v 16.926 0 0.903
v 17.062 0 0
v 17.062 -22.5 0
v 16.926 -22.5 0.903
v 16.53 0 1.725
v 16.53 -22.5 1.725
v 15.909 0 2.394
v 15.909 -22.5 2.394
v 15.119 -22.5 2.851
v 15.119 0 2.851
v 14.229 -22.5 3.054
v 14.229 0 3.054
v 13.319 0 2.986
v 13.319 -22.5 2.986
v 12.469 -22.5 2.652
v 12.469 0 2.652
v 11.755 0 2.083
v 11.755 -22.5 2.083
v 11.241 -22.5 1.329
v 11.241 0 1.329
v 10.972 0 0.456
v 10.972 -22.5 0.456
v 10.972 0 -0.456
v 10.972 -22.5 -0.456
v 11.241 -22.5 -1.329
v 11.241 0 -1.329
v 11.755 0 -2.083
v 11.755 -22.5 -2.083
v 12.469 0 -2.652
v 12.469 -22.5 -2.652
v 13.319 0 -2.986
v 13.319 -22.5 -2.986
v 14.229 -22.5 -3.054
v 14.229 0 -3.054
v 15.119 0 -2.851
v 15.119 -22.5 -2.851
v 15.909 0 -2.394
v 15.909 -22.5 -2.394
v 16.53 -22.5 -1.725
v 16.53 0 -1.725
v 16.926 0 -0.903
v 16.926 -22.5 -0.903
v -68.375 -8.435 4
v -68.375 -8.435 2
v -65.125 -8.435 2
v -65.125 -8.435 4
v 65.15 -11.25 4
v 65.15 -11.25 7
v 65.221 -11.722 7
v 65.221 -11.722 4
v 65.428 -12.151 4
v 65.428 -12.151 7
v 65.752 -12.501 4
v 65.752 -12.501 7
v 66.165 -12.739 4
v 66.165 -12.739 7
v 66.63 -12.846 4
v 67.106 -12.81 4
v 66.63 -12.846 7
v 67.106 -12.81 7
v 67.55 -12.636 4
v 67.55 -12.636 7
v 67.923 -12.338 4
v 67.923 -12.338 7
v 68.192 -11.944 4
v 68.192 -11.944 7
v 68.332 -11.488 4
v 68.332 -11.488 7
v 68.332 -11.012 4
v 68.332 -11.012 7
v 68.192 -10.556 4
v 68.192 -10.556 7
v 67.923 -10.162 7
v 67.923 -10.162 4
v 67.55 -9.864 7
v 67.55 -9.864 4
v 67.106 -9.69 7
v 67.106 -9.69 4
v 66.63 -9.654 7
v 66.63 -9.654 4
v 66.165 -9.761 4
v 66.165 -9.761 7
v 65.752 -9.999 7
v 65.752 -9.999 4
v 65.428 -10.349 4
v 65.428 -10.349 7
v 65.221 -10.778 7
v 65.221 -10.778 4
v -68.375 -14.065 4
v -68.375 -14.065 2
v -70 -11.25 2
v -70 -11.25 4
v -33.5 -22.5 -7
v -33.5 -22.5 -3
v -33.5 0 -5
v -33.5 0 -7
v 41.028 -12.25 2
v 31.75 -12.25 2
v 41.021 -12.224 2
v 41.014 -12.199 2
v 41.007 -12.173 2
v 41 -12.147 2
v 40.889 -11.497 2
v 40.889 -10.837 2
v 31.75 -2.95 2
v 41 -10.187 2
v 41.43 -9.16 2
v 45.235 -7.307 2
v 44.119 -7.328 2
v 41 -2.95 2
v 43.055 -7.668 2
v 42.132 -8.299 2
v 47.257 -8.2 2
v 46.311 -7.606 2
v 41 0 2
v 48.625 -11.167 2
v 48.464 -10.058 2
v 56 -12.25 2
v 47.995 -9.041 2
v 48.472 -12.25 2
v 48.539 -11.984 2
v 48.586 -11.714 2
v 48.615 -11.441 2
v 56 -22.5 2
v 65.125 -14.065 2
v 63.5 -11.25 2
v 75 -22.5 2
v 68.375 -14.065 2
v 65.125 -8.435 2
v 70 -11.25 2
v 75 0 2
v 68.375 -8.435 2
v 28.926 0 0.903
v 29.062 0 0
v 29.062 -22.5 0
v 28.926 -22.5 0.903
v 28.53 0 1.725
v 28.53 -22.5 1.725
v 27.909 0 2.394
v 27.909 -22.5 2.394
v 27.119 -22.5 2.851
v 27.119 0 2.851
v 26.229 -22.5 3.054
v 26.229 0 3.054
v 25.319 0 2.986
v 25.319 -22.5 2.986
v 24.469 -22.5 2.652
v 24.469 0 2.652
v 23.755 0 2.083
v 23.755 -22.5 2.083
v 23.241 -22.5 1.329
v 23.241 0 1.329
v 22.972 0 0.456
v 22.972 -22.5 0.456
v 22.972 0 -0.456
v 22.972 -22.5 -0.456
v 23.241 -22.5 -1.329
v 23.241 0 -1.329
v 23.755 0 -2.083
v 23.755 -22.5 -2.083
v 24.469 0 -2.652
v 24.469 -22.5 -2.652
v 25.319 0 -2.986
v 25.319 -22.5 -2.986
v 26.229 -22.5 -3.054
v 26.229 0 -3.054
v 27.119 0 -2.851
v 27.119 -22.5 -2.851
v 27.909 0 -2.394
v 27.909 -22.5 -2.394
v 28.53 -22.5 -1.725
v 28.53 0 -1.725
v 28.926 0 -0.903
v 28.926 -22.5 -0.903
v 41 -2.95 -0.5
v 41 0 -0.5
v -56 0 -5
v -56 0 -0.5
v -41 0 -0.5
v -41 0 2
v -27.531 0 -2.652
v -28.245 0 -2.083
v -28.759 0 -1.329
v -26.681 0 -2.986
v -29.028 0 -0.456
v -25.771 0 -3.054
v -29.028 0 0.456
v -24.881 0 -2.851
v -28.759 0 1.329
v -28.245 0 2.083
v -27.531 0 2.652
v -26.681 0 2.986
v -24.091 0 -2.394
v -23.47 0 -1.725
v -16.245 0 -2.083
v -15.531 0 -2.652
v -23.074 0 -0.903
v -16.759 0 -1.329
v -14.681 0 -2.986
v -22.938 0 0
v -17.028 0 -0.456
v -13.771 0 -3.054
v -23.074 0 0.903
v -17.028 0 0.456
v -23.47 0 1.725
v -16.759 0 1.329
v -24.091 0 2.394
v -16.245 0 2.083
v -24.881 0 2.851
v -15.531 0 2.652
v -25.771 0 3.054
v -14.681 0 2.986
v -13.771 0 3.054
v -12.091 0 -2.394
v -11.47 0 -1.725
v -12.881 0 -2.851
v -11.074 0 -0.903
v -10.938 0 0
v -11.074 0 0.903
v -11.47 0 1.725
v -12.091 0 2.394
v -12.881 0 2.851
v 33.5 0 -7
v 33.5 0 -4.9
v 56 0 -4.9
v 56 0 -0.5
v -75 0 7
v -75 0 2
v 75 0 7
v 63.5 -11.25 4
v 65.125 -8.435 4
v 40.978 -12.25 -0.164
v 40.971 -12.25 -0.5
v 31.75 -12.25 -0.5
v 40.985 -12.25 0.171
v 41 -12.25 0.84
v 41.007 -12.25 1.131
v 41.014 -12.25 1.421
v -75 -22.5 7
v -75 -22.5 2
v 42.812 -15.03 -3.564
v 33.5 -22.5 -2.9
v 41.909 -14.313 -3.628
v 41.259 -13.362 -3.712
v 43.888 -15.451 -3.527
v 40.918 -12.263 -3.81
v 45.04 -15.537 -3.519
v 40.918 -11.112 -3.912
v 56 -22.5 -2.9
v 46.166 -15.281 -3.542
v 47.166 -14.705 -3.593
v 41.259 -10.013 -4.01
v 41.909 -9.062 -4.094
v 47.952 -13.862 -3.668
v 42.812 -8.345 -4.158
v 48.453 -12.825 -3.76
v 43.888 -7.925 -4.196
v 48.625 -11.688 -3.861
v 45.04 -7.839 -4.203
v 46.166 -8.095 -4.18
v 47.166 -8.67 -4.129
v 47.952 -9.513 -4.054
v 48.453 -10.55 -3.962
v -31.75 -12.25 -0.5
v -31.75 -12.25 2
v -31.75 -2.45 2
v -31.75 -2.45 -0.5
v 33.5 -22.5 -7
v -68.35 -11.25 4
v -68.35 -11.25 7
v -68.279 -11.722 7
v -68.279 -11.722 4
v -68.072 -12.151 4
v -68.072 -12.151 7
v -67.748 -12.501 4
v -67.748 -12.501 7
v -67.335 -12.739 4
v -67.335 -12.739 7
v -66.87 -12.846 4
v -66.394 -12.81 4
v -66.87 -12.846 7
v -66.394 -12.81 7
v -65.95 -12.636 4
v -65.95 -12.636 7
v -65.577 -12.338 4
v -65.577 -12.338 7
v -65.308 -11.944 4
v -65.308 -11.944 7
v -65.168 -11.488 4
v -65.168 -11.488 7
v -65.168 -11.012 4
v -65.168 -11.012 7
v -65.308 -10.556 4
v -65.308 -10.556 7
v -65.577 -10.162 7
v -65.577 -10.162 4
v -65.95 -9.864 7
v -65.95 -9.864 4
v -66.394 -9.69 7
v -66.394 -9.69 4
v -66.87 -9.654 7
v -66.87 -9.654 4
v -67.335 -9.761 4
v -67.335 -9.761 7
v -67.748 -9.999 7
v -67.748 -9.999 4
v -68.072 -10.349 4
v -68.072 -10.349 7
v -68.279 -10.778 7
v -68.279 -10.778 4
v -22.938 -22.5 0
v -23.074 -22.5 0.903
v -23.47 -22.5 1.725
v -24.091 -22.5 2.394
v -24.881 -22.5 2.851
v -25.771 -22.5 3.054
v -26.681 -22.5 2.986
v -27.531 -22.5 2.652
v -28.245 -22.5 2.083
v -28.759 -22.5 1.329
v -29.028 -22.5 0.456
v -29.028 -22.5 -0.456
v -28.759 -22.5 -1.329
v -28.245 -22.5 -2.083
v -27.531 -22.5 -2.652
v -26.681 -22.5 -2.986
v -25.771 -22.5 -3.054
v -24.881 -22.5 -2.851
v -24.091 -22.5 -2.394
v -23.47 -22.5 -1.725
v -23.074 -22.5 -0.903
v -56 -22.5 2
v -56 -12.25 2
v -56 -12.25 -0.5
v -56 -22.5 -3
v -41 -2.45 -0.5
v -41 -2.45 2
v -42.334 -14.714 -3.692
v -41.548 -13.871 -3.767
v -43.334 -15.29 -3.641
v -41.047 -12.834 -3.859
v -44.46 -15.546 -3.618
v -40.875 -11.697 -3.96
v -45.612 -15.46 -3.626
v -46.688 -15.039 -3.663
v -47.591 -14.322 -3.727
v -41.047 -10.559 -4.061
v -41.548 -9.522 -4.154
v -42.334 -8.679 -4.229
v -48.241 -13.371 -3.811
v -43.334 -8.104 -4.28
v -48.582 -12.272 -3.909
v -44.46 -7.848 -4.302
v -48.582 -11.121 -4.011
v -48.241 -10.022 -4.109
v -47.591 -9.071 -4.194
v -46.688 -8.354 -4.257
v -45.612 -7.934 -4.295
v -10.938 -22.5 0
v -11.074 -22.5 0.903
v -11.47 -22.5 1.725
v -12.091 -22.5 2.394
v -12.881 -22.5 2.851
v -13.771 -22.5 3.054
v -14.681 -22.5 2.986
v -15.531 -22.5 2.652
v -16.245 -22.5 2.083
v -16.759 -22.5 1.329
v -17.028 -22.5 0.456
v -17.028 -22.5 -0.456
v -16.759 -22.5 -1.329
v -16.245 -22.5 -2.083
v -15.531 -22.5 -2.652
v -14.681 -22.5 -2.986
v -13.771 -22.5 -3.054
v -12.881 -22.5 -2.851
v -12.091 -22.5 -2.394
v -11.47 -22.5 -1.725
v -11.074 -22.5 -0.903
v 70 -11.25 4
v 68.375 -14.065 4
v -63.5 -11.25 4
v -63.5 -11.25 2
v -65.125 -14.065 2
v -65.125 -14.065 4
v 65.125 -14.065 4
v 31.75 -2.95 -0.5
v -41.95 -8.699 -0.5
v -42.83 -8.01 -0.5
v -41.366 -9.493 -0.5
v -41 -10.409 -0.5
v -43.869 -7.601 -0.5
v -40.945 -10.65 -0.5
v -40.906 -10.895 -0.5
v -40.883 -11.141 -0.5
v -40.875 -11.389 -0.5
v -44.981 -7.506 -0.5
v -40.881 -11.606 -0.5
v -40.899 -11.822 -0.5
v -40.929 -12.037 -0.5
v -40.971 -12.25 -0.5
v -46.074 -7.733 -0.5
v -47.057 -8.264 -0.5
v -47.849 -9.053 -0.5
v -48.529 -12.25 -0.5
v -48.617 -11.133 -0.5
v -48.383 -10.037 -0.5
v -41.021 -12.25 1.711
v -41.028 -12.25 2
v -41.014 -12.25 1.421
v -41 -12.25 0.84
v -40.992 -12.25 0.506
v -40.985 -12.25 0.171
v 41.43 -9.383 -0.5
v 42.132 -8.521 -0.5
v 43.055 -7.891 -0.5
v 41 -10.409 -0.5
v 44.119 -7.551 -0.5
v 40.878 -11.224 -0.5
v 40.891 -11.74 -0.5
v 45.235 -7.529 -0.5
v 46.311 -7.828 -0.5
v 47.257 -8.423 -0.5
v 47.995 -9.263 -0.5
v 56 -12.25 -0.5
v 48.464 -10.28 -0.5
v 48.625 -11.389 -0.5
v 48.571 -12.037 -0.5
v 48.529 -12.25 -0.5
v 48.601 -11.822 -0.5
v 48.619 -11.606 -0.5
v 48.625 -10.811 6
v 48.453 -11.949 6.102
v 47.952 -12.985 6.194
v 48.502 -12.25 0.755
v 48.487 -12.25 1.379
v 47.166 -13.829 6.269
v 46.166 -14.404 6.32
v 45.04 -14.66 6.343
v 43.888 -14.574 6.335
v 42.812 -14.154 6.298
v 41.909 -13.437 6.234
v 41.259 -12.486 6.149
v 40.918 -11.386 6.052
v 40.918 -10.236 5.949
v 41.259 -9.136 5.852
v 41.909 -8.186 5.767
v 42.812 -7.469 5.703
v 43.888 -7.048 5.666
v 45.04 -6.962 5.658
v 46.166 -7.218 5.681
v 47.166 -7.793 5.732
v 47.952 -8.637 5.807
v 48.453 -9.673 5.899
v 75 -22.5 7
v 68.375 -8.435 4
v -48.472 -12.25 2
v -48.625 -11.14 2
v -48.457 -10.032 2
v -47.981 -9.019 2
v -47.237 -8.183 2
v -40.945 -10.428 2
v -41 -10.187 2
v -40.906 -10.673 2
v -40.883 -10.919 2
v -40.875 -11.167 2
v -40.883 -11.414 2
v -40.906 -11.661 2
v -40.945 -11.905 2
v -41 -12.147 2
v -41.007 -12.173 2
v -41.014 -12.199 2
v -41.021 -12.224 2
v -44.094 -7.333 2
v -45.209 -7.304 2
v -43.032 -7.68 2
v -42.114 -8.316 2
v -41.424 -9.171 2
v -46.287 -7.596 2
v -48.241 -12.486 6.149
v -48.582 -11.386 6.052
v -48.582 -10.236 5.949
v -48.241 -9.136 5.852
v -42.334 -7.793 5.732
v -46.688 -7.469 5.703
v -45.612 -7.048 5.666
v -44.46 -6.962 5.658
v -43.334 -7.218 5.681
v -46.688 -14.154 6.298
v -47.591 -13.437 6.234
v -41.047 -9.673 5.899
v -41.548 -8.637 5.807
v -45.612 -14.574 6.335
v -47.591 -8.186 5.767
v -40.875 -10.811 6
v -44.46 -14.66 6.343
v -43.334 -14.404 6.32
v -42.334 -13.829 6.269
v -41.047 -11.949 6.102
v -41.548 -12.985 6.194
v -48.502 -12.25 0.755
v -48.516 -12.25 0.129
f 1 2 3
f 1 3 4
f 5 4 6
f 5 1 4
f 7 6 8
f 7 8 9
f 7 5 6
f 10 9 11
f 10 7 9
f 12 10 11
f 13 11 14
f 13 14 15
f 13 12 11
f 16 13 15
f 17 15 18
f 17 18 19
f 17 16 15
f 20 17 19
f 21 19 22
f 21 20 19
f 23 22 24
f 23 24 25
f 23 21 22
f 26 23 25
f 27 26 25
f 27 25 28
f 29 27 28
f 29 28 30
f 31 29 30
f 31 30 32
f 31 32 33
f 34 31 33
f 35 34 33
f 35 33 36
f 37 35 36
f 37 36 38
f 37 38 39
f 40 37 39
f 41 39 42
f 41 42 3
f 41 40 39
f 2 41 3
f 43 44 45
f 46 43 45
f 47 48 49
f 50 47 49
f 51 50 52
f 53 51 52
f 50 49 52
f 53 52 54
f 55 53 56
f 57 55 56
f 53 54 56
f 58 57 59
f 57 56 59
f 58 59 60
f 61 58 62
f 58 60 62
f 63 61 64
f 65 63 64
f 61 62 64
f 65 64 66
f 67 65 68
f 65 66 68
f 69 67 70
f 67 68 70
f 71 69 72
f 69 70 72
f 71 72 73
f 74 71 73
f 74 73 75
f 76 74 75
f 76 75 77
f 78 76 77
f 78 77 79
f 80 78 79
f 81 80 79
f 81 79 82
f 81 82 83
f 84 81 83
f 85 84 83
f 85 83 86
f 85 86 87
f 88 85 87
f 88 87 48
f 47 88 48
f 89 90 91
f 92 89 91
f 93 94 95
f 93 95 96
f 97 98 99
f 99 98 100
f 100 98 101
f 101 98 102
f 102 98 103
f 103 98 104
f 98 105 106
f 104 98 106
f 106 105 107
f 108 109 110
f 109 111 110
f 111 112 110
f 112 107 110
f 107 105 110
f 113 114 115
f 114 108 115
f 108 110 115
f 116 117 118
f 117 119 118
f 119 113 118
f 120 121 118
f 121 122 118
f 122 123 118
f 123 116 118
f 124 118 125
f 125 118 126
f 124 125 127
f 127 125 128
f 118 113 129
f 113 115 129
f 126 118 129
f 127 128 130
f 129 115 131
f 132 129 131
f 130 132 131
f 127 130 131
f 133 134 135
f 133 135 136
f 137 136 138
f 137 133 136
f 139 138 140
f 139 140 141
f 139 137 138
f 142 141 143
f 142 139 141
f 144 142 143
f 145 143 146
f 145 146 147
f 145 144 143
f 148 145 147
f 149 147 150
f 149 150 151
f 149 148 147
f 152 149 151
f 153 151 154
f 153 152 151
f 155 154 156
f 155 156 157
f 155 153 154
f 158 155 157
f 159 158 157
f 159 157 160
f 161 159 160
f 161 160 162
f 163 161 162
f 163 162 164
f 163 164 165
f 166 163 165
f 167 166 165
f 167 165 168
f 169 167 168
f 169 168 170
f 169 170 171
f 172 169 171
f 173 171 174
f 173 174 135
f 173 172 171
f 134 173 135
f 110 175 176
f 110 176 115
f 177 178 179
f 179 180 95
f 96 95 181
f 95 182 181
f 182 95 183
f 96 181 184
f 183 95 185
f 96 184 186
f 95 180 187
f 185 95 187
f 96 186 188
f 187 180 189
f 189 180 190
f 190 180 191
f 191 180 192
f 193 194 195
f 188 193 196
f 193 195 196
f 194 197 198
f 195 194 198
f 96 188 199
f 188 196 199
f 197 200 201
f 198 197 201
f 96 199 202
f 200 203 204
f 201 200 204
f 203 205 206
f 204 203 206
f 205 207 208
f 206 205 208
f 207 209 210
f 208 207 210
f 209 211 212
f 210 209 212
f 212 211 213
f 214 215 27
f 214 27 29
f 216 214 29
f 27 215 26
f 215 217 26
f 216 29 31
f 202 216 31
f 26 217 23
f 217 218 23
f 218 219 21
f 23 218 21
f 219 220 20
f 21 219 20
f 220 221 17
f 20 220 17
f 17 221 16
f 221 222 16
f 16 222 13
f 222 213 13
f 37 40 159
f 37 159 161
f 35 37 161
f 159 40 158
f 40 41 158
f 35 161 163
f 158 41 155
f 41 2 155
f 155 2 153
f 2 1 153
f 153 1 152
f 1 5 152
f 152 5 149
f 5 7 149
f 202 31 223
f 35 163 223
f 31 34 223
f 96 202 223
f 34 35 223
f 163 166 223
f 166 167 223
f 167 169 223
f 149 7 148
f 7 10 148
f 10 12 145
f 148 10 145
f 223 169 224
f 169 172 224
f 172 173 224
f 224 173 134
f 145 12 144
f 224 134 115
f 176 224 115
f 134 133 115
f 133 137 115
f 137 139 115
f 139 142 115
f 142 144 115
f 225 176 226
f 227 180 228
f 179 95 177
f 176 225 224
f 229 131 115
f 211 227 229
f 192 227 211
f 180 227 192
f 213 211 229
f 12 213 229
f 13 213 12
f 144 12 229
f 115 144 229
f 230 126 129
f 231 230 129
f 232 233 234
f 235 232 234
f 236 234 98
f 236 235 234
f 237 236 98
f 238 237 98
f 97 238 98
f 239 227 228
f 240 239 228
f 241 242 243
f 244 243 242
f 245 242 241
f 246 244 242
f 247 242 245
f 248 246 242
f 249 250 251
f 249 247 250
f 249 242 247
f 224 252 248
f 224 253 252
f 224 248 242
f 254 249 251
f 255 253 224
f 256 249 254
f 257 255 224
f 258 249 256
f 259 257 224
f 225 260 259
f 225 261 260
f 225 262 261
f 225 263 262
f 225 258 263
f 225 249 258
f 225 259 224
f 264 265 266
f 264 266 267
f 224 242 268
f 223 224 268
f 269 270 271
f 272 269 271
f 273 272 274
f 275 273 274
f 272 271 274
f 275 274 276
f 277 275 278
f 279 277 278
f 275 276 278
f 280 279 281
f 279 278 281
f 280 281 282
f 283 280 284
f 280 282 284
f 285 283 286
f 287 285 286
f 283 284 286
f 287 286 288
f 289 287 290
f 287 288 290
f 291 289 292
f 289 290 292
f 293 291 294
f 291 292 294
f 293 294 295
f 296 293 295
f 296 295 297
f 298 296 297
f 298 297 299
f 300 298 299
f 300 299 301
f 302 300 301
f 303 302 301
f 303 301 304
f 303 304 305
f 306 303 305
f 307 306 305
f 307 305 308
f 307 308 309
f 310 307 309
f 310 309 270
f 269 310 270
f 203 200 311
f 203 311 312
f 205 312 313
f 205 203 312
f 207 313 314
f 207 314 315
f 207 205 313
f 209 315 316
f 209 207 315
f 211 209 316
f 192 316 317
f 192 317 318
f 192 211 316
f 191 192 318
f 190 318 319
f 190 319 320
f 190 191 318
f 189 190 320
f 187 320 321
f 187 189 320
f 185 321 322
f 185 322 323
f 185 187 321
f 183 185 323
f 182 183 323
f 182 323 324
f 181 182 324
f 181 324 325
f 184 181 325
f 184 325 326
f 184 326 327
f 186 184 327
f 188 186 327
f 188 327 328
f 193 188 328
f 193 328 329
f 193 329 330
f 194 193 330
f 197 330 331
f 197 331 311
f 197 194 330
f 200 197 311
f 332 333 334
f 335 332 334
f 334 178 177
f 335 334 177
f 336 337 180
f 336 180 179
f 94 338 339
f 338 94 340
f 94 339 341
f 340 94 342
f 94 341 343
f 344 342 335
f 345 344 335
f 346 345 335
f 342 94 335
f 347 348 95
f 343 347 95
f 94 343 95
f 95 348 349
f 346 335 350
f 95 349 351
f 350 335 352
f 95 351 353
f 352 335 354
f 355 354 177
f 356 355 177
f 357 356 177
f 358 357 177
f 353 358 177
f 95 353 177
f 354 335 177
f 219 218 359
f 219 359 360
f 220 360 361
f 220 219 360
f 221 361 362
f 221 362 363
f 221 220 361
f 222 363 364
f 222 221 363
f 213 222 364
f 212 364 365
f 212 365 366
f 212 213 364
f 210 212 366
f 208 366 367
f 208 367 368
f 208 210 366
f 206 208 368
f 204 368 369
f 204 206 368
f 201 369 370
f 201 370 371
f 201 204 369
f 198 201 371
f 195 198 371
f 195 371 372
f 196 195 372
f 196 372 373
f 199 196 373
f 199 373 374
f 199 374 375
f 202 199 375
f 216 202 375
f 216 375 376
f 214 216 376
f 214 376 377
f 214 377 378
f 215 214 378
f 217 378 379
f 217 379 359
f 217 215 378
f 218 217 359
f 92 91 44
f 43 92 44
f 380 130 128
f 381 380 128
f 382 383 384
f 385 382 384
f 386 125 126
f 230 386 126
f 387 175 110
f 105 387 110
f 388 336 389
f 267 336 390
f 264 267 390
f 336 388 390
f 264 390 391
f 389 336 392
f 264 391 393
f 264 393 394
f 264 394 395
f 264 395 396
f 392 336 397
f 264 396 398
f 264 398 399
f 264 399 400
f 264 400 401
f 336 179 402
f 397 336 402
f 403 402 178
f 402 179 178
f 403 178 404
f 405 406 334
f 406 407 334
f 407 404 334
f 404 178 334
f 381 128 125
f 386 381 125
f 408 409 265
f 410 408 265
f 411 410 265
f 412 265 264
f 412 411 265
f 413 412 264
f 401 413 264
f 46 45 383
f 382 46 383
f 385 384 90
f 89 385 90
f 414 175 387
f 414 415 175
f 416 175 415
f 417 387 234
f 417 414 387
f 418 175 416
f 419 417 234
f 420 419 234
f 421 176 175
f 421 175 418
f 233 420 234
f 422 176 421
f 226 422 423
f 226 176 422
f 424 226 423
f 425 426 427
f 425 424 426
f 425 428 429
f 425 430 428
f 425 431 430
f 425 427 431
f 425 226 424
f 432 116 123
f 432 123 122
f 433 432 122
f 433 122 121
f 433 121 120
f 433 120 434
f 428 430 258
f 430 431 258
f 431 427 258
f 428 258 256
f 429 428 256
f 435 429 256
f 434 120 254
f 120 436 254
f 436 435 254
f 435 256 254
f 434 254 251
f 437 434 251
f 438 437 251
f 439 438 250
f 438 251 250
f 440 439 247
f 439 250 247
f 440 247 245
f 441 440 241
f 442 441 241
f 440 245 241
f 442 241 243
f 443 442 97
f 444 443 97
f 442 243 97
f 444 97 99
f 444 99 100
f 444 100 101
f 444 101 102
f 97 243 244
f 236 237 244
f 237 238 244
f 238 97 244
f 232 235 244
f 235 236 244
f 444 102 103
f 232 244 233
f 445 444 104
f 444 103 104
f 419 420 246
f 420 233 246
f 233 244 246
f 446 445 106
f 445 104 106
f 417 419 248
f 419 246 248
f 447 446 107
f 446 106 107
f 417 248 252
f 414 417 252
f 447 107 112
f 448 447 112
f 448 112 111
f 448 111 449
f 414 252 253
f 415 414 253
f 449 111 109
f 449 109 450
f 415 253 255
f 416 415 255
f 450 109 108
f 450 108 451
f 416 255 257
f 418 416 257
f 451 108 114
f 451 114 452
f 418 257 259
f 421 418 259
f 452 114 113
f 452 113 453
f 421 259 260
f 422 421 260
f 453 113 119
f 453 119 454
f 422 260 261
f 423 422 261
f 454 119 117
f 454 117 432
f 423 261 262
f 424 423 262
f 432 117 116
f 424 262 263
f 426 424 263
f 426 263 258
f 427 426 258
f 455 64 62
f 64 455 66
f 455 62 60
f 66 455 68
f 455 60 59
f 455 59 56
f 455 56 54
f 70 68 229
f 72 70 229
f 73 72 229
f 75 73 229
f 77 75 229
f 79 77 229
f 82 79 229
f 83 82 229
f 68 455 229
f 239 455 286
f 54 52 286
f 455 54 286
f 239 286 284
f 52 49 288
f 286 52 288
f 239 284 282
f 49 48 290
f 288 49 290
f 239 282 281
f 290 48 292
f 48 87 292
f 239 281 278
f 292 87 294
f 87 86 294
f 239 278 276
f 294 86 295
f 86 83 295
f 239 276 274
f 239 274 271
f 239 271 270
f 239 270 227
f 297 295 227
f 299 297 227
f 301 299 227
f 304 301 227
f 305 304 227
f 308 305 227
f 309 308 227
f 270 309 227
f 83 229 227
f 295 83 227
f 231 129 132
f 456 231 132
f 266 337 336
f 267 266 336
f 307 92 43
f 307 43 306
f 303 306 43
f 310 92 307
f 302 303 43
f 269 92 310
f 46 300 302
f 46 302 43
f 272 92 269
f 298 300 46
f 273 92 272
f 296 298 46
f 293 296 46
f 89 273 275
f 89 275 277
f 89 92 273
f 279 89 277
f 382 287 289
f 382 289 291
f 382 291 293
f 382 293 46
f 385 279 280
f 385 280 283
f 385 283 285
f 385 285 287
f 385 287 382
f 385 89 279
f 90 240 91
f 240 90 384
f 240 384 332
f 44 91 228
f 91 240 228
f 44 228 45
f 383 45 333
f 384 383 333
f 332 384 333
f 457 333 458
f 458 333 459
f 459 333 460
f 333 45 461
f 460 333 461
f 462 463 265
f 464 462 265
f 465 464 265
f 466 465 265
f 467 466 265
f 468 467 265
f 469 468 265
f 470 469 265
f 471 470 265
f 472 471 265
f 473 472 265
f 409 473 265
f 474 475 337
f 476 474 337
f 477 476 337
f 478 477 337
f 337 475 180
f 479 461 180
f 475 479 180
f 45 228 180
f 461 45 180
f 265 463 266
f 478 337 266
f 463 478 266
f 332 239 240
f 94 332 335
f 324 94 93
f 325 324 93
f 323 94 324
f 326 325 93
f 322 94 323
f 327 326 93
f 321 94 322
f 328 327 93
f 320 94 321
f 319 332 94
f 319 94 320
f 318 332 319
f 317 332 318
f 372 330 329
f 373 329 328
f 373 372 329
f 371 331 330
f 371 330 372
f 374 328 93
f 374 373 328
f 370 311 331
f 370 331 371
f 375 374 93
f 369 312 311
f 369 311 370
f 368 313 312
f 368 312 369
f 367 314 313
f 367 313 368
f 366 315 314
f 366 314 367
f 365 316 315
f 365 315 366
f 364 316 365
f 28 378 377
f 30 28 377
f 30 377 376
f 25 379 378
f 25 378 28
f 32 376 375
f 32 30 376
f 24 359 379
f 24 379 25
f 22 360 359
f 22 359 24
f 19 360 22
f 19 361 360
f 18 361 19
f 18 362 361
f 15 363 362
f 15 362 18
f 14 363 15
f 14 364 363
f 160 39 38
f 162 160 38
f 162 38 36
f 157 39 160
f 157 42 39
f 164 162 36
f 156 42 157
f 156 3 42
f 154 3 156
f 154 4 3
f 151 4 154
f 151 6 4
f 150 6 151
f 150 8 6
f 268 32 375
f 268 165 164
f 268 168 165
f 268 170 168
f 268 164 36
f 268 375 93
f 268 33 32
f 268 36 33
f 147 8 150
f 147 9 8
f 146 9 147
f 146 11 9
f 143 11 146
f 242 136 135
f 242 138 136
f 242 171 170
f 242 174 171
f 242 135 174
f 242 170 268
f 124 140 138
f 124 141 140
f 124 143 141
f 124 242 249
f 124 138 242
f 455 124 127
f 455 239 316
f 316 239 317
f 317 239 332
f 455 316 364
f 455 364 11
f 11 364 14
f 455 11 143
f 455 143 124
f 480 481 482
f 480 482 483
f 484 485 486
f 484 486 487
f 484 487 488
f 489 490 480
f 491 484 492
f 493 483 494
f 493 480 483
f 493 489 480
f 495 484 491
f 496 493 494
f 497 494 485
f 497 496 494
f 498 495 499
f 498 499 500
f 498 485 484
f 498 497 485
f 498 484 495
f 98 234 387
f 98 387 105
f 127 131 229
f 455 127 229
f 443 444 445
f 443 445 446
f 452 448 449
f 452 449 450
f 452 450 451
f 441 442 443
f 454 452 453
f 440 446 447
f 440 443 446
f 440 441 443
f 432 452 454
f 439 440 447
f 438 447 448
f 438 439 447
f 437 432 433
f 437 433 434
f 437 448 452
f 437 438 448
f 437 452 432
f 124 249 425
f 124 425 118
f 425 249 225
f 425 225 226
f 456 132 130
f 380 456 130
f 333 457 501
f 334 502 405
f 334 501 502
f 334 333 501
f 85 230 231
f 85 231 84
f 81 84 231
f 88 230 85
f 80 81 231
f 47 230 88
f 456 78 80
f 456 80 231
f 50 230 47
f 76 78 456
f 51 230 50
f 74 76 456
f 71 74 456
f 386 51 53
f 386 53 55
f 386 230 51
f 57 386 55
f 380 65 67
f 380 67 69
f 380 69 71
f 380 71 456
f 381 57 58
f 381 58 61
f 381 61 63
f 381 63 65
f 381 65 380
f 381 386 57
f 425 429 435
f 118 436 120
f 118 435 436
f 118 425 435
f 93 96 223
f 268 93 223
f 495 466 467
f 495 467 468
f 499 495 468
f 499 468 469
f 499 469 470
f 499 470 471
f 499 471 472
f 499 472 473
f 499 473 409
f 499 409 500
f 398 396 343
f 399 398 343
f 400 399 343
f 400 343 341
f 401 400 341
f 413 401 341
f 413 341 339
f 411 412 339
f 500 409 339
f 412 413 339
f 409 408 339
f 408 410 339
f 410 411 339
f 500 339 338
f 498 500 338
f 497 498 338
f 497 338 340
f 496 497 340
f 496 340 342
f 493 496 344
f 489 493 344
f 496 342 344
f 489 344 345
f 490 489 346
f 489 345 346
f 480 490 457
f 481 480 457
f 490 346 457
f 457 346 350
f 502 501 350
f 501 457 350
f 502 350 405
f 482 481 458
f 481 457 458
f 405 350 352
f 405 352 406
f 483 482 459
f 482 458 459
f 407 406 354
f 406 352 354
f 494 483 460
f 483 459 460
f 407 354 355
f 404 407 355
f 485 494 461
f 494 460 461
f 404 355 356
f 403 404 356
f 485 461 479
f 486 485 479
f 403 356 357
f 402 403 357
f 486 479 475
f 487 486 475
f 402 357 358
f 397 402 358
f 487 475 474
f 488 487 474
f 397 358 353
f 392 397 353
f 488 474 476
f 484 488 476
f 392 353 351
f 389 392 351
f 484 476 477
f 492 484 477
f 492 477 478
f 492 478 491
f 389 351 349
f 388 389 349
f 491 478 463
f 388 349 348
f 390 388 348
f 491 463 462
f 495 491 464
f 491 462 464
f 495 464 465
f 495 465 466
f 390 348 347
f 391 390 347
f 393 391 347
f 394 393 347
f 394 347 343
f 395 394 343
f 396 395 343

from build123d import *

# Parameters (mm, degrees)
SKETCH007_R     = 3.0625
PAD002_DEPTH    = 22.5
POCKET005_DEPTH = 22.5
POCKET006_DEPTH = 22.5
SKETCH010_R     = 3.875
POCKET007_DEPTH = 10
SKETCH011_W     = 2.5
SKETCH011_H     = 12.25
POCKET008_DEPTH = 15
SKETCH012_W     = 2.5
SKETCH012_H     = 9.3
POCKET009_DEPTH = 9.25
SKETCH013_W     = 2.5
SKETCH013_H     = 12.25
POCKET010_DEPTH = 15
SKETCH014_W     = 2.5
SKETCH014_H     = 9.8
POCKET011_DEPTH = 9.25
SKETCH031_R     = 1.6
POCKET019_DEPTH = 5
POCKET020_DEPTH = 2


with BuildPart() as part:
    # Sketch007 → Pad002 (new body)
    with BuildSketch(Plane.XZ):
        Polygon((-56, -7), (56, -7), (56, 2), (75, 2), (75, 7), (-75, 7), (-75, 2), (-56, 2), align=None)
        with Locations((-14, 0)):
            Circle(SKETCH007_R, mode=Mode.SUBTRACT)
        with Locations((14, 0)):
            Circle(SKETCH007_R, mode=Mode.SUBTRACT)
        with Locations((-26, 0)):
            Circle(SKETCH007_R, mode=Mode.SUBTRACT)
        with Locations((26, 0)):
            Circle(SKETCH007_R, mode=Mode.SUBTRACT)
    extrude(amount=PAD002_DEPTH)

    # Sketch008 (on Face3 of Pad002) → Pocket005 (cut)
    with BuildSketch(Plane(origin=(-56, 0, 0), x_dir=(0, 0, -1), z_dir=(-1, 0, 0))):
        Polygon((5, 22.5), (3, 22.5), (5, 0), (12, 0), (12, 22.5), align=None)
    extrude(amount=-POCKET005_DEPTH, mode=Mode.SUBTRACT)

    # Sketch009 (on Face11 of Pocket005) → Pocket006 (cut)
    with BuildSketch(Plane(origin=(56, 0, 0), x_dir=(0, 0, 1), z_dir=(1, 0, 0))):
        Polygon((-4.9, 0), (-11.9, 0), (-11.9, 22.5), (-4.9, 22.5), (-2.9, 22.5), align=None)
    extrude(amount=-POCKET006_DEPTH, mode=Mode.SUBTRACT)

    # Sketch010 (on Face8 of Pocket006) → Pocket007 (cut)
    with BuildSketch(Plane(origin=(0, -0.4409603136, -4.9608035277), x_dir=(1, 0, 0), z_dir=(0, -0.0885397903, -0.9960726407))):
        with Locations((-44.75, 11.3)):
            Circle(SKETCH010_R)
        with Locations((44.75, 11.3)):
            Circle(SKETCH010_R)
    extrude(amount=-POCKET007_DEPTH, mode=Mode.SUBTRACT)

    # Sketch011 (on Face13 of Pocket007) → Pocket008 (cut)
    with BuildSketch(Plane(origin=(56, 0, 0), x_dir=(0, 0, 1), z_dir=(1, 0, 0))):
        with Locations((0.75, 6.125)):
            Rectangle(SKETCH011_W, SKETCH011_H)
    extrude(amount=-POCKET008_DEPTH, mode=Mode.SUBTRACT)

    # Sketch012 (on Face15 of Pocket008) → Pocket009 (cut)
    with BuildSketch(Plane(origin=(41, 0, 0), x_dir=(0, 0, 1), z_dir=(1, 0, 0))):
        with Locations((0.75, 7.6)):
            Rectangle(SKETCH012_W, SKETCH012_H)
    extrude(amount=-POCKET009_DEPTH, mode=Mode.SUBTRACT)

    # Sketch013 (on Face7 of Pocket009) → Pocket010 (cut)
    with BuildSketch(Plane(origin=(-56, 0, 0), x_dir=(0, 0, -1), z_dir=(-1, 0, 0))):
        with Locations((-0.75, 6.125)):
            Rectangle(SKETCH013_W, SKETCH013_H)
    extrude(amount=-POCKET010_DEPTH, mode=Mode.SUBTRACT)

    # Sketch014 (on Face9 of Pocket010) → Pocket011 (cut)
    with BuildSketch(Plane(origin=(-41, 0, 0), x_dir=(0, 0, -1), z_dir=(-1, 0, 0))):
        with Locations((-0.75, 7.35)):
            Rectangle(SKETCH014_W, SKETCH014_H)
    extrude(amount=-POCKET011_DEPTH, mode=Mode.SUBTRACT)

    # Sketch031 (on Face2 of Pocket011) → Pocket019 (cut)
    with BuildSketch(Plane(origin=(0, 0, 7), x_dir=(-1, 0, 0), z_dir=(0, 0, 1))):
        with Locations((-66.75, 11.25)):
            Circle(SKETCH031_R)
        with Locations((66.75, 11.25)):
            Circle(SKETCH031_R)
    extrude(amount=-POCKET019_DEPTH, mode=Mode.SUBTRACT)

    # Sketch032 (on Face22 of Pocket019) → Pocket020 (cut)
    with BuildSketch(Plane(origin=(0, 0, 2), x_dir=(1, 0, 0), z_dir=(0, 0, -1))):
        Polygon((-65.125, 8.4354174377), (-63.5, 11.25), (-65.125, 14.0645825623), (-68.375, 14.0645825623), (-70, 11.25), (-68.375, 8.4354174377), align=None)
        Polygon((68.375, 8.4354174377), (70, 11.25), (68.375, 14.0645825623), (65.125, 14.0645825623), (63.5, 11.25), (65.125, 8.4354174377), align=None)
    extrude(amount=-POCKET020_DEPTH, mode=Mode.SUBTRACT)


solid = part.part
